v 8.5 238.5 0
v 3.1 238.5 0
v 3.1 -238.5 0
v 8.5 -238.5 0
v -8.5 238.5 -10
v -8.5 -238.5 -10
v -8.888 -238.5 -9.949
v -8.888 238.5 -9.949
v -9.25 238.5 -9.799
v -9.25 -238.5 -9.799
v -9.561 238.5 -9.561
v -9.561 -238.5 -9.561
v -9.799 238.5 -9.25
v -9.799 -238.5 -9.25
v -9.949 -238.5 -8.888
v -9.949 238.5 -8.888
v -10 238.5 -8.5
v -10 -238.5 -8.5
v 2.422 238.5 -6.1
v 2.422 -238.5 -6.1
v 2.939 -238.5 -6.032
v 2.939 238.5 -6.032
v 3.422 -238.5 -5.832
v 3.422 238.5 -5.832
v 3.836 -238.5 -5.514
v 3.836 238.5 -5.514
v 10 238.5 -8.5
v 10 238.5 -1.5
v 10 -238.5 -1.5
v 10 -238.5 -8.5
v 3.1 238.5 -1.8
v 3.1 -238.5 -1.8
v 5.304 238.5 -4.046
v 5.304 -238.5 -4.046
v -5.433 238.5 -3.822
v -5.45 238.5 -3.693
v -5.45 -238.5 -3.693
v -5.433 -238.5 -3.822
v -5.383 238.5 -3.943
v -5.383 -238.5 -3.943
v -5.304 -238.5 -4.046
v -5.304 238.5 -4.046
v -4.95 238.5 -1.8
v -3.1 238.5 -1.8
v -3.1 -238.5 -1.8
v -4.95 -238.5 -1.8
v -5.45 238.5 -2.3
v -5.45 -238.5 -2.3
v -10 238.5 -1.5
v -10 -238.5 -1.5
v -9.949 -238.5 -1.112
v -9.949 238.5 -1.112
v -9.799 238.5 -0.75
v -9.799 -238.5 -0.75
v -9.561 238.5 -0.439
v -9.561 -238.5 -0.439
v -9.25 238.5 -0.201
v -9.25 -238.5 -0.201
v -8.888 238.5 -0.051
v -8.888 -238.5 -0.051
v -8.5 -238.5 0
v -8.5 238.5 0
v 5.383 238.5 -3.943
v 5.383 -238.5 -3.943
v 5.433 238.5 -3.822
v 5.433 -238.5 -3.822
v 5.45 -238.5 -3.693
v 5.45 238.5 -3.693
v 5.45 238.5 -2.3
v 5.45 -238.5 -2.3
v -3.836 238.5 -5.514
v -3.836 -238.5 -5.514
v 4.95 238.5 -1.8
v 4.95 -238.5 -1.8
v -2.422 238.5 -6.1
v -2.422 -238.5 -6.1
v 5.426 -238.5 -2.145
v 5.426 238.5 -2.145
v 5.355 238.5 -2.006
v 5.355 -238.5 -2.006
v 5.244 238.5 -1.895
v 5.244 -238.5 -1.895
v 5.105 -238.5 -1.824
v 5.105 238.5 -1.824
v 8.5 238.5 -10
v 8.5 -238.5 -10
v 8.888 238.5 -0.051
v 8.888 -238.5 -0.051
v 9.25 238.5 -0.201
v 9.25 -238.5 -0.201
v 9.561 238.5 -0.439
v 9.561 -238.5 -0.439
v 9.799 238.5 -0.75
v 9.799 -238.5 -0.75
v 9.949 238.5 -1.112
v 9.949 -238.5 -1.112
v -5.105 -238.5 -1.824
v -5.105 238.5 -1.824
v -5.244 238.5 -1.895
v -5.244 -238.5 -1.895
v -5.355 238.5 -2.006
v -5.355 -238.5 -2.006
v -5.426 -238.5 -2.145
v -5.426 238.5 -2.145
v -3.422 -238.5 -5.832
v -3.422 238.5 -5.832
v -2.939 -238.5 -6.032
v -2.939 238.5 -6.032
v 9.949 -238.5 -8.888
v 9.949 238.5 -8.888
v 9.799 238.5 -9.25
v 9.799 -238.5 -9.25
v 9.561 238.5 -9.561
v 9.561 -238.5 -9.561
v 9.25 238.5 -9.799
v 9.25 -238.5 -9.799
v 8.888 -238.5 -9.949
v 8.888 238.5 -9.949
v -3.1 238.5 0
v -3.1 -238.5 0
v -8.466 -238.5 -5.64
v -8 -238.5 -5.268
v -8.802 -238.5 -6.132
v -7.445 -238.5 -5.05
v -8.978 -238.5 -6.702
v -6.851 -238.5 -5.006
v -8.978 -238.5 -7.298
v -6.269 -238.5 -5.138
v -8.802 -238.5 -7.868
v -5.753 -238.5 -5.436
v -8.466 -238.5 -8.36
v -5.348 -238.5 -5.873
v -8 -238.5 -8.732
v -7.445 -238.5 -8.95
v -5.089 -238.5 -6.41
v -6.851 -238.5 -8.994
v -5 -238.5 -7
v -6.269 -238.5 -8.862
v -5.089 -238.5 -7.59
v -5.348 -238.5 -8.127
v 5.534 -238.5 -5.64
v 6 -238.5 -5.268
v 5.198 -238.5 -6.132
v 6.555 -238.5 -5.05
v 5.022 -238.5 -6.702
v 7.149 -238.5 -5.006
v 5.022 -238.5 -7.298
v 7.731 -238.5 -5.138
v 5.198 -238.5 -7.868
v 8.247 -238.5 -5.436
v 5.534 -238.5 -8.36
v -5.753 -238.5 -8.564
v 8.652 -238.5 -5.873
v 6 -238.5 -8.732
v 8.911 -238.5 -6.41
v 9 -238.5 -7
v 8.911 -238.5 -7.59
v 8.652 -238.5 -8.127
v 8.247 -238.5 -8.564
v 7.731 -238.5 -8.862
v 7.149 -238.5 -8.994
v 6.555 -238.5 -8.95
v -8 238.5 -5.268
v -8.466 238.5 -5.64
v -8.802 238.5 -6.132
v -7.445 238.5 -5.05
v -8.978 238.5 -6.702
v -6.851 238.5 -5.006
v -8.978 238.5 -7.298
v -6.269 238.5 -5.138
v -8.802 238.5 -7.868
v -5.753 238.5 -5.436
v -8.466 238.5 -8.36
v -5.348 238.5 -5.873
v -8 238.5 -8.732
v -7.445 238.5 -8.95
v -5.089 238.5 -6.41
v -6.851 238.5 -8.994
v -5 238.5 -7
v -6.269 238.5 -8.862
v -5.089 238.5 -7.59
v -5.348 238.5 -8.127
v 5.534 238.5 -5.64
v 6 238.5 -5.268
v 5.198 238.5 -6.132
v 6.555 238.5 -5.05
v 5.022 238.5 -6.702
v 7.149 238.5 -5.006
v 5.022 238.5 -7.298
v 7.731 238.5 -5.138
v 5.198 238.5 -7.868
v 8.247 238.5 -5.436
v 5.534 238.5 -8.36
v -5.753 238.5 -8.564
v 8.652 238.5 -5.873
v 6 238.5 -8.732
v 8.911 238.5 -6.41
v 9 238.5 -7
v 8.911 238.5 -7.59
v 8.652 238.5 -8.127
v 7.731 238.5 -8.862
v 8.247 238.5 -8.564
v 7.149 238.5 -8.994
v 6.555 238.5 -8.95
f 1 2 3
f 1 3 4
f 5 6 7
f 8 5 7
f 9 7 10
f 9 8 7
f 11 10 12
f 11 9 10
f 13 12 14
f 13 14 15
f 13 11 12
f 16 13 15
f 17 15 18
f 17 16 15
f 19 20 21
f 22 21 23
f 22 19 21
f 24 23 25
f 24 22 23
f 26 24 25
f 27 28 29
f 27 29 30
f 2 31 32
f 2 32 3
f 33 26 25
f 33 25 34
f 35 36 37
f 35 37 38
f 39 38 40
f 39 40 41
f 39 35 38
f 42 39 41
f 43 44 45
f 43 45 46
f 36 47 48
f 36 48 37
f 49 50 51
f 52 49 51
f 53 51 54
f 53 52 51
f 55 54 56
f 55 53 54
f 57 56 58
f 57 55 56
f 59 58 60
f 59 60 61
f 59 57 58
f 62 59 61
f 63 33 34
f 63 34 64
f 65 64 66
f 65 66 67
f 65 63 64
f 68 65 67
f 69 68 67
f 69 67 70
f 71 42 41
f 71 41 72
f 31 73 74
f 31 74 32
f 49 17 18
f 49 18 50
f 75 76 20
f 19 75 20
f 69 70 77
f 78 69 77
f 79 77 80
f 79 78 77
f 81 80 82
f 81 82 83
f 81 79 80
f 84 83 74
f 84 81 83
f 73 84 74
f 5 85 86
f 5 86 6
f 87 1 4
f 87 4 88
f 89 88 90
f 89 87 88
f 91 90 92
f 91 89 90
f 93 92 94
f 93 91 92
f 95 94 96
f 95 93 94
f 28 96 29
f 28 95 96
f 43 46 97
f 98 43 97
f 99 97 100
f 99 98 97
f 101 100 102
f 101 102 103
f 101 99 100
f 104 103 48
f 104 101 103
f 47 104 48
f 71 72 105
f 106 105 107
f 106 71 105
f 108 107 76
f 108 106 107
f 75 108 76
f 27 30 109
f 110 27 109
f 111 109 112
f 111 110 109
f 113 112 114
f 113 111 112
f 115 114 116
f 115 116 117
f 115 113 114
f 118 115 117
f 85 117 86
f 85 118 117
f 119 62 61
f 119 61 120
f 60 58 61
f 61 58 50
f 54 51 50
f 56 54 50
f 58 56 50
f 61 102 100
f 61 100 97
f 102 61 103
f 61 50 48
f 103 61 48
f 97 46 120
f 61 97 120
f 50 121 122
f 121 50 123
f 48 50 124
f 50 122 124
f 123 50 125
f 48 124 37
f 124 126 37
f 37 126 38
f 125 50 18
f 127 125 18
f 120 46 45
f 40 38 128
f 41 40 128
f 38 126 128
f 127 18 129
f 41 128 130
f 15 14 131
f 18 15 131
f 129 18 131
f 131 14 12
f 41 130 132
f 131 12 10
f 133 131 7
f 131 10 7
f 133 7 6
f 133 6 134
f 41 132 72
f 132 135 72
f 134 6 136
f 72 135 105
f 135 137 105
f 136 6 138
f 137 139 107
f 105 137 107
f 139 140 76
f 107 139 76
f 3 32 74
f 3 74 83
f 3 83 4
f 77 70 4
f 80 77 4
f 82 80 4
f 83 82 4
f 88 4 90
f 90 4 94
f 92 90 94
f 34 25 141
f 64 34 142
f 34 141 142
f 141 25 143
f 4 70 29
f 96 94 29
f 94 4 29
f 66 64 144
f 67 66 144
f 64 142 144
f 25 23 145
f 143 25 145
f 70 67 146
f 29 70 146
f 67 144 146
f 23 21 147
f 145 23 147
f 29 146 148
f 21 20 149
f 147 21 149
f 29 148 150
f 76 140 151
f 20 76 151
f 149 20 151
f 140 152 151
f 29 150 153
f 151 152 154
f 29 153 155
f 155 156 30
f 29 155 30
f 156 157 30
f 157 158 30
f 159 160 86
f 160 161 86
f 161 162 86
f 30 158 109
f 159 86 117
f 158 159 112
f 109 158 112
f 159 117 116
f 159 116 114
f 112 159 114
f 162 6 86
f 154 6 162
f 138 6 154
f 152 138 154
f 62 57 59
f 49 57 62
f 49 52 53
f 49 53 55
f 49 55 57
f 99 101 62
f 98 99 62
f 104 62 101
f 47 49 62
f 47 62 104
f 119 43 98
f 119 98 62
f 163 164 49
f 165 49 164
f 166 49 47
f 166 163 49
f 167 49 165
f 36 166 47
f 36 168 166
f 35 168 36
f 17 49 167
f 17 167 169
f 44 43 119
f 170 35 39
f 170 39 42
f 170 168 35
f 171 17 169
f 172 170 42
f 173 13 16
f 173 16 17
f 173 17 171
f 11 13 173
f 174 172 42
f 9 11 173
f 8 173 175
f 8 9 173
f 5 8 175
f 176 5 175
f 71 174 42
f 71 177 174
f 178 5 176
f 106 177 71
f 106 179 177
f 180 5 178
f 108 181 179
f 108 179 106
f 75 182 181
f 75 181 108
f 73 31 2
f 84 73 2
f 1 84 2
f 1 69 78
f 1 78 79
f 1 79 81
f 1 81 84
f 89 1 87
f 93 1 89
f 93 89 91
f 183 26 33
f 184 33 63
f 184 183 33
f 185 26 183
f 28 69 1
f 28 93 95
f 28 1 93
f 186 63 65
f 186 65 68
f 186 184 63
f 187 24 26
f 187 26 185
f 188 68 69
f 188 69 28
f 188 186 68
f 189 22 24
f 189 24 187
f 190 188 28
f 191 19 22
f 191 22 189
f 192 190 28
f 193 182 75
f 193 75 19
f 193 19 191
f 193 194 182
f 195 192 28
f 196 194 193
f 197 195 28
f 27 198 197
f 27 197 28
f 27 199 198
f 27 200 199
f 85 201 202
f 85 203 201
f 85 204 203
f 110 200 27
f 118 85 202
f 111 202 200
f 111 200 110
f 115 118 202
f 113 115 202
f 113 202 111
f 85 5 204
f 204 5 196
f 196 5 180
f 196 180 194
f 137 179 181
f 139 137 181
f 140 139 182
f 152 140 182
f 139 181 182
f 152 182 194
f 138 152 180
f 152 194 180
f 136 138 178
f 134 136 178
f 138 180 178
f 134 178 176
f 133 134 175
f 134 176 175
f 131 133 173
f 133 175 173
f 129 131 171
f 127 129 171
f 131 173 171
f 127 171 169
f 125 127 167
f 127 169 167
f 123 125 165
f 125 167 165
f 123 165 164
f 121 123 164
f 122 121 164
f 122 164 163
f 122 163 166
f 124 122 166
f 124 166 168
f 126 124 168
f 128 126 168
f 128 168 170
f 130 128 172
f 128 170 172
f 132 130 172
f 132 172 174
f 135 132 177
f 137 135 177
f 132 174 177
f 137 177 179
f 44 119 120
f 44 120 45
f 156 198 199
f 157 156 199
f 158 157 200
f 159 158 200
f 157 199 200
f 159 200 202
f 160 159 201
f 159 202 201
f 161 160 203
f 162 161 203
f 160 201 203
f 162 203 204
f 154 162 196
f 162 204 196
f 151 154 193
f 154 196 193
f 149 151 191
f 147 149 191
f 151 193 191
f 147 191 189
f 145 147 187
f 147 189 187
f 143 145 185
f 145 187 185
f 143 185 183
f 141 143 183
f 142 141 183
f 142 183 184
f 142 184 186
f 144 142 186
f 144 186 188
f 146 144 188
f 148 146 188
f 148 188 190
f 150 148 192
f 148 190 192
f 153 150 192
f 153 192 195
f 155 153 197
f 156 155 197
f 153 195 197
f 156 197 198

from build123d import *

# Parameters (mm, degrees)
SKETCH1_R           = 2
BOSS_EXTRUDE1_DEPTH = 477


with BuildPart() as part:
    # Sketch1 → Boss-Extrude1 (new body)
    with BuildSketch(Plane(origin=(0, 238.5, 0), x_dir=(1, 0, 0), z_dir=(0, 1, 0))):
        with BuildLine():
            Line((-3.1, 1.8), (-4.95, 1.8))
            ThreePointArc((-4.95, 1.8), (-5.303553391, 1.946446609), (-5.45, 2.3))
            Line((-5.45, 2.3), (-5.45, 3.692893219))
            ThreePointArc((-5.45, 3.692893219), (-5.411939766, 3.884234935), (-5.303553391, 4.046446609))
            Line((-5.303553391, 4.046446609), (-3.835786438, 5.514213562))
            ThreePointArc((-3.835786438, 5.514213562), (-3.18693974, 5.947759065), (-2.421572875, 6.1))
            Line((-2.421572875, 6.1), (2.421572875, 6.1))
            ThreePointArc((2.421572875, 6.1), (3.18693974, 5.947759065), (3.835786438, 5.514213562))
            Line((3.835786438, 5.514213562), (5.303553391, 4.046446609))
            ThreePointArc((5.303553391, 4.046446609), (5.411939766, 3.884234935), (5.45, 3.692893219))
            Line((5.45, 3.692893219), (5.45, 2.3))
            ThreePointArc((5.45, 2.3), (5.303553391, 1.946446609), (4.95, 1.8))
            Line((4.95, 1.8), (3.1, 1.8))
            Line((3.1, 1.8), (3.1, 0))
            Line((3.1, 0), (8.5, 0))
            ThreePointArc((8.5, 0), (9.560660172, 0.439339828), (10, 1.5))
            Line((10, 1.5), (10, 8.5))
            ThreePointArc((10, 8.5), (9.560660172, 9.560660172), (8.5, 10))
            Line((8.5, 10), (-8.5, 10))
            ThreePointArc((-8.5, 10), (-9.560660172, 9.560660172), (-10, 8.5))
            Line((-10, 8.5), (-10, 1.5))
            ThreePointArc((-10, 1.5), (-9.560660172, 0.439339828), (-8.5, 0))
            Line((-8.5, 0), (-3.1, 0))
            Line((-3.1, 0), (-3.1, 1.8))
        make_face()
        with Locations((-7, 7)):
            Circle(SKETCH1_R, mode=Mode.SUBTRACT)
        with Locations((7, 7)):
            Circle(SKETCH1_R, mode=Mode.SUBTRACT)
    extrude(amount=-BOSS_EXTRUDE1_DEPTH)


solid = part.part
